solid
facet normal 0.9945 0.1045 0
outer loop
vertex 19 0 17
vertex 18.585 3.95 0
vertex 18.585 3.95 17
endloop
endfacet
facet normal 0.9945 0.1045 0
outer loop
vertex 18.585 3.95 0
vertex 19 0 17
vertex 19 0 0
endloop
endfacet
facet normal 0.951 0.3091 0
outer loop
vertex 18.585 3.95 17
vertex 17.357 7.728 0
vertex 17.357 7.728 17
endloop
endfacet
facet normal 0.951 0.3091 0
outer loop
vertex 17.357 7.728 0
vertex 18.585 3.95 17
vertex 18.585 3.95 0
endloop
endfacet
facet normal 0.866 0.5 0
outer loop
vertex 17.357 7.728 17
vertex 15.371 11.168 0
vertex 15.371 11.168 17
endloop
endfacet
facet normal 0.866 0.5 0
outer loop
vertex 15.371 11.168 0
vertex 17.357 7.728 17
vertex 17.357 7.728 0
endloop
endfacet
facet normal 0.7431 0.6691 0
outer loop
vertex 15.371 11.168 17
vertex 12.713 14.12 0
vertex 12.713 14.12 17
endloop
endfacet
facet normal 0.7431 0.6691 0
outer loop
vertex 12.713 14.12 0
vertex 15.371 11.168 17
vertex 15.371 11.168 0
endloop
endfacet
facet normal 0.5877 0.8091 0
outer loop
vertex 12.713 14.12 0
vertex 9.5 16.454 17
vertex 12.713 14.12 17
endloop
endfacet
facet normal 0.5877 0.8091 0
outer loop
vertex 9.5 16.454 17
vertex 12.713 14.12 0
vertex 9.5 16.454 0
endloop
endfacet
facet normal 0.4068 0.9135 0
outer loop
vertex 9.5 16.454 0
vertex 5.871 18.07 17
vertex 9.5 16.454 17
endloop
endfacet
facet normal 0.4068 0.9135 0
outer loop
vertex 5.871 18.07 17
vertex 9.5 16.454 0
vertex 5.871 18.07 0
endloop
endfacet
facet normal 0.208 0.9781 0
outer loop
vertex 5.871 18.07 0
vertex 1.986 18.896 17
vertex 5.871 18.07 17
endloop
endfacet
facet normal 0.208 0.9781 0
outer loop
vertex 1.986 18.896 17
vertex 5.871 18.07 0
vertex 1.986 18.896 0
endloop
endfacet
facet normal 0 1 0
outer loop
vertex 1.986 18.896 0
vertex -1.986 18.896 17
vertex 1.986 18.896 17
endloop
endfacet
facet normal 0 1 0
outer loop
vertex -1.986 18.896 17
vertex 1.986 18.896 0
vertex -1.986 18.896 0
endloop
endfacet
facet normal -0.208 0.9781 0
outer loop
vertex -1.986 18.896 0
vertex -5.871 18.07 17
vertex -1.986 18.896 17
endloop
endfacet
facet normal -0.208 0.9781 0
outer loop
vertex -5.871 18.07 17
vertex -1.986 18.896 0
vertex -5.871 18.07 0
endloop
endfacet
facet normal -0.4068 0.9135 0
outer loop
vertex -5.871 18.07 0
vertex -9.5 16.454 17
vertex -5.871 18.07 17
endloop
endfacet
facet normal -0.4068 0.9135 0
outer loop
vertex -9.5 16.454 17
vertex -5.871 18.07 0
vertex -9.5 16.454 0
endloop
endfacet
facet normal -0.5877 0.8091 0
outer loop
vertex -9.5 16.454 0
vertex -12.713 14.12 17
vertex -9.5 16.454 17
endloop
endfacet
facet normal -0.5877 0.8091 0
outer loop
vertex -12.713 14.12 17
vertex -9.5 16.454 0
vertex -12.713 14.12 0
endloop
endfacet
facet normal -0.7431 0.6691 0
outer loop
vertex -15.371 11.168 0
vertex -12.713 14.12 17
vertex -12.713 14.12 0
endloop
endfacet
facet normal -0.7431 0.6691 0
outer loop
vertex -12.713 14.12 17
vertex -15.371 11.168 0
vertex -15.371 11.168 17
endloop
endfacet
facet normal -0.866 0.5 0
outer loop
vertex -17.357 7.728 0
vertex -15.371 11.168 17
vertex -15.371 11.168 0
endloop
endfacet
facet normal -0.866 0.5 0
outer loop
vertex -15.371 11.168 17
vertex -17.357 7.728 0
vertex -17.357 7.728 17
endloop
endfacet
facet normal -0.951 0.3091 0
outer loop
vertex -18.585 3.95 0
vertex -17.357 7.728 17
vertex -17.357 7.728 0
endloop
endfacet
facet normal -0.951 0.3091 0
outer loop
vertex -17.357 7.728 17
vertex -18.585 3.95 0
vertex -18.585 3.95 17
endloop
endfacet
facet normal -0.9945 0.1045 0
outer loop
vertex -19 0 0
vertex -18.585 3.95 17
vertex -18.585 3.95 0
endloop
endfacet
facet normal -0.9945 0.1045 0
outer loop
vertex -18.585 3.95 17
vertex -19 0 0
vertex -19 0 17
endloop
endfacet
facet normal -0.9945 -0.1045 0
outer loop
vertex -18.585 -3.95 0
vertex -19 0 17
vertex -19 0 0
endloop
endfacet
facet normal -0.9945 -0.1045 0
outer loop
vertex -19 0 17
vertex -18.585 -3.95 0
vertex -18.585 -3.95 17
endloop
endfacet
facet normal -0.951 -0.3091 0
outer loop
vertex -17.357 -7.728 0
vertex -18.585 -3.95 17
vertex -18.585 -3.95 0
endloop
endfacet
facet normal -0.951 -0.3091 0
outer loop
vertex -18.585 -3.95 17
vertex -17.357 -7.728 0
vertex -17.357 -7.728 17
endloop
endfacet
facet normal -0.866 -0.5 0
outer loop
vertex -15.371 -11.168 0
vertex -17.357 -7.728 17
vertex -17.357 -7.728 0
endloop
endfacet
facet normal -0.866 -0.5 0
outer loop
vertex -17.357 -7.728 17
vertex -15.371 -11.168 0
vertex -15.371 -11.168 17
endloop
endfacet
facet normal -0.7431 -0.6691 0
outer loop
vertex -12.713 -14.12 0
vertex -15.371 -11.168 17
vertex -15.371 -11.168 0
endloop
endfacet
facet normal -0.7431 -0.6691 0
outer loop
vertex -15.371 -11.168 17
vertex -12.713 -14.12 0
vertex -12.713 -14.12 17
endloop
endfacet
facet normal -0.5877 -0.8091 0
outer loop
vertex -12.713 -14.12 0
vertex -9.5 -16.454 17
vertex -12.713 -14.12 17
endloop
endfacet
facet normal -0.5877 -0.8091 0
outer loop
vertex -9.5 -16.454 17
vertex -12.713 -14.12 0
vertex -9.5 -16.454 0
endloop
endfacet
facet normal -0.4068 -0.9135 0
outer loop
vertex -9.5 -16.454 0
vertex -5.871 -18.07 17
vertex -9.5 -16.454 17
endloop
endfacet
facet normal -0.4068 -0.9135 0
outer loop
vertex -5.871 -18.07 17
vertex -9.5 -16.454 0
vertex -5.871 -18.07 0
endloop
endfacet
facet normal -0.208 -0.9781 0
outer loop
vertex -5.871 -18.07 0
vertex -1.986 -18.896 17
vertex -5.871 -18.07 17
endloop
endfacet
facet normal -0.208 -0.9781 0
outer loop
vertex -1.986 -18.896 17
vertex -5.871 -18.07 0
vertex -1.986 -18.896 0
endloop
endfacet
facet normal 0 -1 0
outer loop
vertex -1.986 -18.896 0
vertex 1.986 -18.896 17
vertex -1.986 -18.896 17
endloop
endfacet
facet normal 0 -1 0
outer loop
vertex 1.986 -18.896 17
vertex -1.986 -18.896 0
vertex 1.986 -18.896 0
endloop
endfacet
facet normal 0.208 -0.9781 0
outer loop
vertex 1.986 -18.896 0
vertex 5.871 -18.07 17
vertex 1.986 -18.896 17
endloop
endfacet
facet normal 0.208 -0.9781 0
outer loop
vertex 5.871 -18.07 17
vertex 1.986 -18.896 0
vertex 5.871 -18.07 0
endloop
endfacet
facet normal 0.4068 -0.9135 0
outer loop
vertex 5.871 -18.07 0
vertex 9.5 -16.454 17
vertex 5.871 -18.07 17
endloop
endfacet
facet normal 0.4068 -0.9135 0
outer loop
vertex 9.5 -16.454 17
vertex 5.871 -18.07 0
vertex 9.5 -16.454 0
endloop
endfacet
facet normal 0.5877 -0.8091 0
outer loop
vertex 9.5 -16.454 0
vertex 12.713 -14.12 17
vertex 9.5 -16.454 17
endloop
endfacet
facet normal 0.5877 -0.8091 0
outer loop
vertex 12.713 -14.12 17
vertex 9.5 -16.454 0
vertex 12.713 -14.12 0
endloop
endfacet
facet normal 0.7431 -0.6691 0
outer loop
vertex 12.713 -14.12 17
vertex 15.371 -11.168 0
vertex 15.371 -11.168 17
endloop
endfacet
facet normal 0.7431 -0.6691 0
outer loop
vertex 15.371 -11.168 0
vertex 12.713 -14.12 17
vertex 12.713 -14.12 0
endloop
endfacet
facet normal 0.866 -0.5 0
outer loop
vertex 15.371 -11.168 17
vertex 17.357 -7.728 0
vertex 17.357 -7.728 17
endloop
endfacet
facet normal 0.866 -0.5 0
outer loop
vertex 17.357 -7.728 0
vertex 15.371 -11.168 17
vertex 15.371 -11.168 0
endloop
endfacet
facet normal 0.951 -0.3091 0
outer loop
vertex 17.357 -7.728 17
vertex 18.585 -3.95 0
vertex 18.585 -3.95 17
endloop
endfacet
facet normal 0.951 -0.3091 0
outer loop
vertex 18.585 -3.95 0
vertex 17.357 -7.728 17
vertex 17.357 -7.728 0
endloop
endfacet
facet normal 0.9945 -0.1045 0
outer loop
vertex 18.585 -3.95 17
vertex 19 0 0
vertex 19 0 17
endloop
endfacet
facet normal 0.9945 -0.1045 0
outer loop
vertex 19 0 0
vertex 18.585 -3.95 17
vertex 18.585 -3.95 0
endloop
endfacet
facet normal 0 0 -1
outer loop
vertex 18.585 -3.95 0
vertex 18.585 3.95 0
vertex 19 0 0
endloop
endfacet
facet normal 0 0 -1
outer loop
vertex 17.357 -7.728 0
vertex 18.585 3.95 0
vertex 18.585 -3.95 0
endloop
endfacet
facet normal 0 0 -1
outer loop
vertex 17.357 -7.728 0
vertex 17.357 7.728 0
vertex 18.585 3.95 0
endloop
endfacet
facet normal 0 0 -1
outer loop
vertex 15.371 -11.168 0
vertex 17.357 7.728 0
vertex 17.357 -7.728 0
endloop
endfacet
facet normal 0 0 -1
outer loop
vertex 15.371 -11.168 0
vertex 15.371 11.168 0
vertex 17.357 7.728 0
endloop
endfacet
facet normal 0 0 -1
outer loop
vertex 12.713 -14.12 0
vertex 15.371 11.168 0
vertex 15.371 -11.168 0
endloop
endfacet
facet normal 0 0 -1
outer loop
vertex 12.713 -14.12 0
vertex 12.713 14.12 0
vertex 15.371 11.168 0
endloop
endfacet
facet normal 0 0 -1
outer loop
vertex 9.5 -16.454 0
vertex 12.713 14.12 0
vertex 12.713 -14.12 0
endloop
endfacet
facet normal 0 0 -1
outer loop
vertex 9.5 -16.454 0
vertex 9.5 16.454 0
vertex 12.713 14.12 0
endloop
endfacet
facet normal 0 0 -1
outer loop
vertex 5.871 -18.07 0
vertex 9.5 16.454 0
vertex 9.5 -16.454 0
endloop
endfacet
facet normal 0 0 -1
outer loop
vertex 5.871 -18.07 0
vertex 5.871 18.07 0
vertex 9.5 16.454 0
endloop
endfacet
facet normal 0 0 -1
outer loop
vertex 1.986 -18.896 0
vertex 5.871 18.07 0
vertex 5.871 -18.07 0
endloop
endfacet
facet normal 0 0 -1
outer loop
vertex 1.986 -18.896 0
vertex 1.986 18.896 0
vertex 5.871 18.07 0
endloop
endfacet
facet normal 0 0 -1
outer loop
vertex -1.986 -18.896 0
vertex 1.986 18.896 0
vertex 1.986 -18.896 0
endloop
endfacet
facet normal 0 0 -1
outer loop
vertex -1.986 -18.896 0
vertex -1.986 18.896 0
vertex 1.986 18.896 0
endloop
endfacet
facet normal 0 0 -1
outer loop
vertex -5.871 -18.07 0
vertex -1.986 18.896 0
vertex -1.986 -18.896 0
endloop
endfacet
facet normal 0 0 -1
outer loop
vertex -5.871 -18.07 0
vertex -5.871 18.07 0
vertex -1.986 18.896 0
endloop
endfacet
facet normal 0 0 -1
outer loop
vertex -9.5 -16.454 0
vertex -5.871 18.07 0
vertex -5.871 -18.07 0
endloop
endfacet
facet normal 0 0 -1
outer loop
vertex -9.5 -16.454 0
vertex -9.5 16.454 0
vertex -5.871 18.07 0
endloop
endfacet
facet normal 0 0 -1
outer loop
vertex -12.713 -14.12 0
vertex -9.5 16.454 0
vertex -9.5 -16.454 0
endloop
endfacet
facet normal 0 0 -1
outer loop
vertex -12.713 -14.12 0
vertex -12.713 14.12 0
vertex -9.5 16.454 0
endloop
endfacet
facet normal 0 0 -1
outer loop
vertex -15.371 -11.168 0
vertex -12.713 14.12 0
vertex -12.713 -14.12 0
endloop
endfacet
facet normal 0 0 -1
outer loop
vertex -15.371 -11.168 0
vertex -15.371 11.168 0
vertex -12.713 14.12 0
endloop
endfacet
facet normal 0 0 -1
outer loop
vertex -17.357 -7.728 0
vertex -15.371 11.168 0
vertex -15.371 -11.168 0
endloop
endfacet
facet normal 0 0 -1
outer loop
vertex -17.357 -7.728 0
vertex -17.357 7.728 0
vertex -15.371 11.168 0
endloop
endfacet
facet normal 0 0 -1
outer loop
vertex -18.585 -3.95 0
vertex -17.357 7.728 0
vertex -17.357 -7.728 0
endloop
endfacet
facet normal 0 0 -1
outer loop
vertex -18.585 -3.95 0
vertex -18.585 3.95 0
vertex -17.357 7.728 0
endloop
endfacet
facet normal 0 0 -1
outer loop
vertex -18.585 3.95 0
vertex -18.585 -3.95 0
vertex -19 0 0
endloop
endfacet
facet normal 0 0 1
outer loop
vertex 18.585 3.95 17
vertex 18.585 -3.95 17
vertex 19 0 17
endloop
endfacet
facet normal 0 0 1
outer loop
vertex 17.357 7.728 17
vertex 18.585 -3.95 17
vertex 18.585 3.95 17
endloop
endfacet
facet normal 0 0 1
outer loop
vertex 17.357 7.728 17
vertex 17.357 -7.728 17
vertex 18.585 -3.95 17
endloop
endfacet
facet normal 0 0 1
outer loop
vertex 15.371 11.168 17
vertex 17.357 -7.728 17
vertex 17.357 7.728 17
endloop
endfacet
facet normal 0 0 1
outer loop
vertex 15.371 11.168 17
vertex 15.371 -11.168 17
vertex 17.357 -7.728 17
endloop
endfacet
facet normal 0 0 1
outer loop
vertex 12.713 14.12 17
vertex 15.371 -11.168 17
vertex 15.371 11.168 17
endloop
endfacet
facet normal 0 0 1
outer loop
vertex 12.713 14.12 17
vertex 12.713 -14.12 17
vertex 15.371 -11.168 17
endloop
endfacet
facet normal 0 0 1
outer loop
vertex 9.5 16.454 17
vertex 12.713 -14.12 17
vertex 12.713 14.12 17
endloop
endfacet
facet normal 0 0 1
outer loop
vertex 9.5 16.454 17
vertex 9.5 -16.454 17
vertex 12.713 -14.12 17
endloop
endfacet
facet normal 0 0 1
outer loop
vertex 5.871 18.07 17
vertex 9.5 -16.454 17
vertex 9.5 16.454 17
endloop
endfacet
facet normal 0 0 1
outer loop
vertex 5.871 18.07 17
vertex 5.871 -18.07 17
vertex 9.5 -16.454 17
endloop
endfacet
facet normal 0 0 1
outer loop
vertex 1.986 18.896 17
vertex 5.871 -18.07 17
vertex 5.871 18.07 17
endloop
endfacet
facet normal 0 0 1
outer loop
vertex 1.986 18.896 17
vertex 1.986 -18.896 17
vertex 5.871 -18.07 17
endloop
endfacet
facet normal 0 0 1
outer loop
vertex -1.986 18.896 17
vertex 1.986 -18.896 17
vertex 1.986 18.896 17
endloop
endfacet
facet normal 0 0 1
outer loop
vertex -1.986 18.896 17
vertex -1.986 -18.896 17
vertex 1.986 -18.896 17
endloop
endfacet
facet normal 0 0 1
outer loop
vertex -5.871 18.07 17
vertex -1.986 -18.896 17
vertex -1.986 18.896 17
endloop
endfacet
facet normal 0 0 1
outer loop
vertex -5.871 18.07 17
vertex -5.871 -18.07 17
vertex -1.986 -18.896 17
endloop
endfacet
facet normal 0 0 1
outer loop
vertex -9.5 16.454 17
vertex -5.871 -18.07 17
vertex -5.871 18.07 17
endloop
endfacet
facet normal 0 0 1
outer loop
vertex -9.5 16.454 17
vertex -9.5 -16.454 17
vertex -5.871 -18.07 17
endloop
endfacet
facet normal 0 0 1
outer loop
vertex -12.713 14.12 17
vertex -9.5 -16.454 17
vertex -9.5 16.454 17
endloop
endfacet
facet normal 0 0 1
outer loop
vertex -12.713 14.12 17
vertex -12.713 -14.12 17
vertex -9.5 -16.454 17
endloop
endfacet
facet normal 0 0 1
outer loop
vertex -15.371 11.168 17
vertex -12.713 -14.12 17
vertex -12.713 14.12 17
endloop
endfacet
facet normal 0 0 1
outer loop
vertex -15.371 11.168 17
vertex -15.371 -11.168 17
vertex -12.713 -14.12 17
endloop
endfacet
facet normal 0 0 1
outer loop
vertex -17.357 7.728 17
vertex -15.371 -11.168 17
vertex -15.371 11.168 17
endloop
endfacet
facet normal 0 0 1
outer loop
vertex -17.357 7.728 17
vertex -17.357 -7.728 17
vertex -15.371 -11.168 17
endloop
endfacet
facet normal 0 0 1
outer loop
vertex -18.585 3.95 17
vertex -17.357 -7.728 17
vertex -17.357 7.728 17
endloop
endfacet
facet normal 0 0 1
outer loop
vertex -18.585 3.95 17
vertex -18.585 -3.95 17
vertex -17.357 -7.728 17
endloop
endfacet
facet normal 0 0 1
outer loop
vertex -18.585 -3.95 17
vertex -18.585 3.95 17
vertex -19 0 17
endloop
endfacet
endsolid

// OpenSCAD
// Generated by SolidPython 1.0.1 on 2020-07-29 00:46:45


cylinder(h = 17, r1 = 19, r2 = 19);
/***********************************************
*********      SolidPython code:      **********
************************************************
 
# import packages: SolidPython
from solid import *
from solid.utils import *
from itertools import chain, combinations, permutations


class Resize:

    def __init__(self, scad_file):
        self.scad_file = scad_file
        #self.scad_file = import_scad(scad_file)
        # cone/cylinder param:
        self.r1 = 0
        self.r2 = 0
        self.h = 0
        # rectangular prism param:
        self.w = 0
        self.l = 0
        # ellipse param:
        self.r = 0

    # import OpenScad code (file name corresponds to shape)


    # classify shape + parameters
    def assign(self, param1, param2, param3):
        if self.scad_file == 'cone.scad':
            self.r1 = param1
            self.r2 = param2
            self.h = param3
        elif self.scad_file == 'cylinder.scad':
            self.r1 = param1
            self.r2 = param2
            self.h = param3
        elif self.scad_file == 'rectangularPrism.scad':
            self.h = param1
            self.l = param2
            self.w = param3
        else:
            self.r = param1
            self.h = param2

    # resize parameters
    def iterate(self):
        x = range(3, 20, 2)
        i = 1
        if self.scad_file == 'cone.scad':
            tempList = list(permutations(x, 2))
            for temp in tempList:
                param1 = temp[0]
                param2 = temp[1]
                filepath = 'produced_scad_files/' + 'cone' + str(param1) + '_' + str(param2) + '_' + '.scad'
                scad_render_to_file(cylinder(h=param1, r1=param2, r2=0), filepath)

        elif self.scad_file == 'cylinder.scad':
            tempList = list(permutations(x, 3))
            for temp in tempList:
                param1 = temp[0]
                param2 = temp[1]
                filepath = 'produced_scad_files/' + 'cylinder' + str(param1) + '_' + str(param2) + '_' + '.scad'
                scad_render_to_file(cylinder(h=param1, r1=param2, r2=param2), filepath)

        elif self.scad_file == 'rectangularPrism.scad':
            tempList = list(permutations(x, 3))
            for temp in tempList:
                param1 = temp[0]
                param2 = temp[1]
                param3 = temp[2]
                filepath = 'produced_scad_files/' + 'rectangularPrism' + str(param1) + '_' + str(param2) + '_' + str(
                    param3) + '.scad'
                scad_render_to_file(cube(size=(param1, param2, param3)), filepath)

        elif self.scad_file == 'ellipse.scad':
            tempList = list(permutations(x, 4))
            for temp in tempList:
                param1 = temp[0]
                param2 = temp[1]
                param3 = temp[2]
                param4 = temp[3]
                filepath = 'produced_scad_files/' + 'ellipse' + str(param1) + '_' + str(param2) + '_' + str(param3) + '_' + str(param4) + '.scad'
                scad_render_to_file(scale([param1, param2, param3])(sphere(r=param4)), filepath)

    def render_to_scadfile(self):
        scad_render_to_file(scad, 'example.scad') 
 
************************************************/
